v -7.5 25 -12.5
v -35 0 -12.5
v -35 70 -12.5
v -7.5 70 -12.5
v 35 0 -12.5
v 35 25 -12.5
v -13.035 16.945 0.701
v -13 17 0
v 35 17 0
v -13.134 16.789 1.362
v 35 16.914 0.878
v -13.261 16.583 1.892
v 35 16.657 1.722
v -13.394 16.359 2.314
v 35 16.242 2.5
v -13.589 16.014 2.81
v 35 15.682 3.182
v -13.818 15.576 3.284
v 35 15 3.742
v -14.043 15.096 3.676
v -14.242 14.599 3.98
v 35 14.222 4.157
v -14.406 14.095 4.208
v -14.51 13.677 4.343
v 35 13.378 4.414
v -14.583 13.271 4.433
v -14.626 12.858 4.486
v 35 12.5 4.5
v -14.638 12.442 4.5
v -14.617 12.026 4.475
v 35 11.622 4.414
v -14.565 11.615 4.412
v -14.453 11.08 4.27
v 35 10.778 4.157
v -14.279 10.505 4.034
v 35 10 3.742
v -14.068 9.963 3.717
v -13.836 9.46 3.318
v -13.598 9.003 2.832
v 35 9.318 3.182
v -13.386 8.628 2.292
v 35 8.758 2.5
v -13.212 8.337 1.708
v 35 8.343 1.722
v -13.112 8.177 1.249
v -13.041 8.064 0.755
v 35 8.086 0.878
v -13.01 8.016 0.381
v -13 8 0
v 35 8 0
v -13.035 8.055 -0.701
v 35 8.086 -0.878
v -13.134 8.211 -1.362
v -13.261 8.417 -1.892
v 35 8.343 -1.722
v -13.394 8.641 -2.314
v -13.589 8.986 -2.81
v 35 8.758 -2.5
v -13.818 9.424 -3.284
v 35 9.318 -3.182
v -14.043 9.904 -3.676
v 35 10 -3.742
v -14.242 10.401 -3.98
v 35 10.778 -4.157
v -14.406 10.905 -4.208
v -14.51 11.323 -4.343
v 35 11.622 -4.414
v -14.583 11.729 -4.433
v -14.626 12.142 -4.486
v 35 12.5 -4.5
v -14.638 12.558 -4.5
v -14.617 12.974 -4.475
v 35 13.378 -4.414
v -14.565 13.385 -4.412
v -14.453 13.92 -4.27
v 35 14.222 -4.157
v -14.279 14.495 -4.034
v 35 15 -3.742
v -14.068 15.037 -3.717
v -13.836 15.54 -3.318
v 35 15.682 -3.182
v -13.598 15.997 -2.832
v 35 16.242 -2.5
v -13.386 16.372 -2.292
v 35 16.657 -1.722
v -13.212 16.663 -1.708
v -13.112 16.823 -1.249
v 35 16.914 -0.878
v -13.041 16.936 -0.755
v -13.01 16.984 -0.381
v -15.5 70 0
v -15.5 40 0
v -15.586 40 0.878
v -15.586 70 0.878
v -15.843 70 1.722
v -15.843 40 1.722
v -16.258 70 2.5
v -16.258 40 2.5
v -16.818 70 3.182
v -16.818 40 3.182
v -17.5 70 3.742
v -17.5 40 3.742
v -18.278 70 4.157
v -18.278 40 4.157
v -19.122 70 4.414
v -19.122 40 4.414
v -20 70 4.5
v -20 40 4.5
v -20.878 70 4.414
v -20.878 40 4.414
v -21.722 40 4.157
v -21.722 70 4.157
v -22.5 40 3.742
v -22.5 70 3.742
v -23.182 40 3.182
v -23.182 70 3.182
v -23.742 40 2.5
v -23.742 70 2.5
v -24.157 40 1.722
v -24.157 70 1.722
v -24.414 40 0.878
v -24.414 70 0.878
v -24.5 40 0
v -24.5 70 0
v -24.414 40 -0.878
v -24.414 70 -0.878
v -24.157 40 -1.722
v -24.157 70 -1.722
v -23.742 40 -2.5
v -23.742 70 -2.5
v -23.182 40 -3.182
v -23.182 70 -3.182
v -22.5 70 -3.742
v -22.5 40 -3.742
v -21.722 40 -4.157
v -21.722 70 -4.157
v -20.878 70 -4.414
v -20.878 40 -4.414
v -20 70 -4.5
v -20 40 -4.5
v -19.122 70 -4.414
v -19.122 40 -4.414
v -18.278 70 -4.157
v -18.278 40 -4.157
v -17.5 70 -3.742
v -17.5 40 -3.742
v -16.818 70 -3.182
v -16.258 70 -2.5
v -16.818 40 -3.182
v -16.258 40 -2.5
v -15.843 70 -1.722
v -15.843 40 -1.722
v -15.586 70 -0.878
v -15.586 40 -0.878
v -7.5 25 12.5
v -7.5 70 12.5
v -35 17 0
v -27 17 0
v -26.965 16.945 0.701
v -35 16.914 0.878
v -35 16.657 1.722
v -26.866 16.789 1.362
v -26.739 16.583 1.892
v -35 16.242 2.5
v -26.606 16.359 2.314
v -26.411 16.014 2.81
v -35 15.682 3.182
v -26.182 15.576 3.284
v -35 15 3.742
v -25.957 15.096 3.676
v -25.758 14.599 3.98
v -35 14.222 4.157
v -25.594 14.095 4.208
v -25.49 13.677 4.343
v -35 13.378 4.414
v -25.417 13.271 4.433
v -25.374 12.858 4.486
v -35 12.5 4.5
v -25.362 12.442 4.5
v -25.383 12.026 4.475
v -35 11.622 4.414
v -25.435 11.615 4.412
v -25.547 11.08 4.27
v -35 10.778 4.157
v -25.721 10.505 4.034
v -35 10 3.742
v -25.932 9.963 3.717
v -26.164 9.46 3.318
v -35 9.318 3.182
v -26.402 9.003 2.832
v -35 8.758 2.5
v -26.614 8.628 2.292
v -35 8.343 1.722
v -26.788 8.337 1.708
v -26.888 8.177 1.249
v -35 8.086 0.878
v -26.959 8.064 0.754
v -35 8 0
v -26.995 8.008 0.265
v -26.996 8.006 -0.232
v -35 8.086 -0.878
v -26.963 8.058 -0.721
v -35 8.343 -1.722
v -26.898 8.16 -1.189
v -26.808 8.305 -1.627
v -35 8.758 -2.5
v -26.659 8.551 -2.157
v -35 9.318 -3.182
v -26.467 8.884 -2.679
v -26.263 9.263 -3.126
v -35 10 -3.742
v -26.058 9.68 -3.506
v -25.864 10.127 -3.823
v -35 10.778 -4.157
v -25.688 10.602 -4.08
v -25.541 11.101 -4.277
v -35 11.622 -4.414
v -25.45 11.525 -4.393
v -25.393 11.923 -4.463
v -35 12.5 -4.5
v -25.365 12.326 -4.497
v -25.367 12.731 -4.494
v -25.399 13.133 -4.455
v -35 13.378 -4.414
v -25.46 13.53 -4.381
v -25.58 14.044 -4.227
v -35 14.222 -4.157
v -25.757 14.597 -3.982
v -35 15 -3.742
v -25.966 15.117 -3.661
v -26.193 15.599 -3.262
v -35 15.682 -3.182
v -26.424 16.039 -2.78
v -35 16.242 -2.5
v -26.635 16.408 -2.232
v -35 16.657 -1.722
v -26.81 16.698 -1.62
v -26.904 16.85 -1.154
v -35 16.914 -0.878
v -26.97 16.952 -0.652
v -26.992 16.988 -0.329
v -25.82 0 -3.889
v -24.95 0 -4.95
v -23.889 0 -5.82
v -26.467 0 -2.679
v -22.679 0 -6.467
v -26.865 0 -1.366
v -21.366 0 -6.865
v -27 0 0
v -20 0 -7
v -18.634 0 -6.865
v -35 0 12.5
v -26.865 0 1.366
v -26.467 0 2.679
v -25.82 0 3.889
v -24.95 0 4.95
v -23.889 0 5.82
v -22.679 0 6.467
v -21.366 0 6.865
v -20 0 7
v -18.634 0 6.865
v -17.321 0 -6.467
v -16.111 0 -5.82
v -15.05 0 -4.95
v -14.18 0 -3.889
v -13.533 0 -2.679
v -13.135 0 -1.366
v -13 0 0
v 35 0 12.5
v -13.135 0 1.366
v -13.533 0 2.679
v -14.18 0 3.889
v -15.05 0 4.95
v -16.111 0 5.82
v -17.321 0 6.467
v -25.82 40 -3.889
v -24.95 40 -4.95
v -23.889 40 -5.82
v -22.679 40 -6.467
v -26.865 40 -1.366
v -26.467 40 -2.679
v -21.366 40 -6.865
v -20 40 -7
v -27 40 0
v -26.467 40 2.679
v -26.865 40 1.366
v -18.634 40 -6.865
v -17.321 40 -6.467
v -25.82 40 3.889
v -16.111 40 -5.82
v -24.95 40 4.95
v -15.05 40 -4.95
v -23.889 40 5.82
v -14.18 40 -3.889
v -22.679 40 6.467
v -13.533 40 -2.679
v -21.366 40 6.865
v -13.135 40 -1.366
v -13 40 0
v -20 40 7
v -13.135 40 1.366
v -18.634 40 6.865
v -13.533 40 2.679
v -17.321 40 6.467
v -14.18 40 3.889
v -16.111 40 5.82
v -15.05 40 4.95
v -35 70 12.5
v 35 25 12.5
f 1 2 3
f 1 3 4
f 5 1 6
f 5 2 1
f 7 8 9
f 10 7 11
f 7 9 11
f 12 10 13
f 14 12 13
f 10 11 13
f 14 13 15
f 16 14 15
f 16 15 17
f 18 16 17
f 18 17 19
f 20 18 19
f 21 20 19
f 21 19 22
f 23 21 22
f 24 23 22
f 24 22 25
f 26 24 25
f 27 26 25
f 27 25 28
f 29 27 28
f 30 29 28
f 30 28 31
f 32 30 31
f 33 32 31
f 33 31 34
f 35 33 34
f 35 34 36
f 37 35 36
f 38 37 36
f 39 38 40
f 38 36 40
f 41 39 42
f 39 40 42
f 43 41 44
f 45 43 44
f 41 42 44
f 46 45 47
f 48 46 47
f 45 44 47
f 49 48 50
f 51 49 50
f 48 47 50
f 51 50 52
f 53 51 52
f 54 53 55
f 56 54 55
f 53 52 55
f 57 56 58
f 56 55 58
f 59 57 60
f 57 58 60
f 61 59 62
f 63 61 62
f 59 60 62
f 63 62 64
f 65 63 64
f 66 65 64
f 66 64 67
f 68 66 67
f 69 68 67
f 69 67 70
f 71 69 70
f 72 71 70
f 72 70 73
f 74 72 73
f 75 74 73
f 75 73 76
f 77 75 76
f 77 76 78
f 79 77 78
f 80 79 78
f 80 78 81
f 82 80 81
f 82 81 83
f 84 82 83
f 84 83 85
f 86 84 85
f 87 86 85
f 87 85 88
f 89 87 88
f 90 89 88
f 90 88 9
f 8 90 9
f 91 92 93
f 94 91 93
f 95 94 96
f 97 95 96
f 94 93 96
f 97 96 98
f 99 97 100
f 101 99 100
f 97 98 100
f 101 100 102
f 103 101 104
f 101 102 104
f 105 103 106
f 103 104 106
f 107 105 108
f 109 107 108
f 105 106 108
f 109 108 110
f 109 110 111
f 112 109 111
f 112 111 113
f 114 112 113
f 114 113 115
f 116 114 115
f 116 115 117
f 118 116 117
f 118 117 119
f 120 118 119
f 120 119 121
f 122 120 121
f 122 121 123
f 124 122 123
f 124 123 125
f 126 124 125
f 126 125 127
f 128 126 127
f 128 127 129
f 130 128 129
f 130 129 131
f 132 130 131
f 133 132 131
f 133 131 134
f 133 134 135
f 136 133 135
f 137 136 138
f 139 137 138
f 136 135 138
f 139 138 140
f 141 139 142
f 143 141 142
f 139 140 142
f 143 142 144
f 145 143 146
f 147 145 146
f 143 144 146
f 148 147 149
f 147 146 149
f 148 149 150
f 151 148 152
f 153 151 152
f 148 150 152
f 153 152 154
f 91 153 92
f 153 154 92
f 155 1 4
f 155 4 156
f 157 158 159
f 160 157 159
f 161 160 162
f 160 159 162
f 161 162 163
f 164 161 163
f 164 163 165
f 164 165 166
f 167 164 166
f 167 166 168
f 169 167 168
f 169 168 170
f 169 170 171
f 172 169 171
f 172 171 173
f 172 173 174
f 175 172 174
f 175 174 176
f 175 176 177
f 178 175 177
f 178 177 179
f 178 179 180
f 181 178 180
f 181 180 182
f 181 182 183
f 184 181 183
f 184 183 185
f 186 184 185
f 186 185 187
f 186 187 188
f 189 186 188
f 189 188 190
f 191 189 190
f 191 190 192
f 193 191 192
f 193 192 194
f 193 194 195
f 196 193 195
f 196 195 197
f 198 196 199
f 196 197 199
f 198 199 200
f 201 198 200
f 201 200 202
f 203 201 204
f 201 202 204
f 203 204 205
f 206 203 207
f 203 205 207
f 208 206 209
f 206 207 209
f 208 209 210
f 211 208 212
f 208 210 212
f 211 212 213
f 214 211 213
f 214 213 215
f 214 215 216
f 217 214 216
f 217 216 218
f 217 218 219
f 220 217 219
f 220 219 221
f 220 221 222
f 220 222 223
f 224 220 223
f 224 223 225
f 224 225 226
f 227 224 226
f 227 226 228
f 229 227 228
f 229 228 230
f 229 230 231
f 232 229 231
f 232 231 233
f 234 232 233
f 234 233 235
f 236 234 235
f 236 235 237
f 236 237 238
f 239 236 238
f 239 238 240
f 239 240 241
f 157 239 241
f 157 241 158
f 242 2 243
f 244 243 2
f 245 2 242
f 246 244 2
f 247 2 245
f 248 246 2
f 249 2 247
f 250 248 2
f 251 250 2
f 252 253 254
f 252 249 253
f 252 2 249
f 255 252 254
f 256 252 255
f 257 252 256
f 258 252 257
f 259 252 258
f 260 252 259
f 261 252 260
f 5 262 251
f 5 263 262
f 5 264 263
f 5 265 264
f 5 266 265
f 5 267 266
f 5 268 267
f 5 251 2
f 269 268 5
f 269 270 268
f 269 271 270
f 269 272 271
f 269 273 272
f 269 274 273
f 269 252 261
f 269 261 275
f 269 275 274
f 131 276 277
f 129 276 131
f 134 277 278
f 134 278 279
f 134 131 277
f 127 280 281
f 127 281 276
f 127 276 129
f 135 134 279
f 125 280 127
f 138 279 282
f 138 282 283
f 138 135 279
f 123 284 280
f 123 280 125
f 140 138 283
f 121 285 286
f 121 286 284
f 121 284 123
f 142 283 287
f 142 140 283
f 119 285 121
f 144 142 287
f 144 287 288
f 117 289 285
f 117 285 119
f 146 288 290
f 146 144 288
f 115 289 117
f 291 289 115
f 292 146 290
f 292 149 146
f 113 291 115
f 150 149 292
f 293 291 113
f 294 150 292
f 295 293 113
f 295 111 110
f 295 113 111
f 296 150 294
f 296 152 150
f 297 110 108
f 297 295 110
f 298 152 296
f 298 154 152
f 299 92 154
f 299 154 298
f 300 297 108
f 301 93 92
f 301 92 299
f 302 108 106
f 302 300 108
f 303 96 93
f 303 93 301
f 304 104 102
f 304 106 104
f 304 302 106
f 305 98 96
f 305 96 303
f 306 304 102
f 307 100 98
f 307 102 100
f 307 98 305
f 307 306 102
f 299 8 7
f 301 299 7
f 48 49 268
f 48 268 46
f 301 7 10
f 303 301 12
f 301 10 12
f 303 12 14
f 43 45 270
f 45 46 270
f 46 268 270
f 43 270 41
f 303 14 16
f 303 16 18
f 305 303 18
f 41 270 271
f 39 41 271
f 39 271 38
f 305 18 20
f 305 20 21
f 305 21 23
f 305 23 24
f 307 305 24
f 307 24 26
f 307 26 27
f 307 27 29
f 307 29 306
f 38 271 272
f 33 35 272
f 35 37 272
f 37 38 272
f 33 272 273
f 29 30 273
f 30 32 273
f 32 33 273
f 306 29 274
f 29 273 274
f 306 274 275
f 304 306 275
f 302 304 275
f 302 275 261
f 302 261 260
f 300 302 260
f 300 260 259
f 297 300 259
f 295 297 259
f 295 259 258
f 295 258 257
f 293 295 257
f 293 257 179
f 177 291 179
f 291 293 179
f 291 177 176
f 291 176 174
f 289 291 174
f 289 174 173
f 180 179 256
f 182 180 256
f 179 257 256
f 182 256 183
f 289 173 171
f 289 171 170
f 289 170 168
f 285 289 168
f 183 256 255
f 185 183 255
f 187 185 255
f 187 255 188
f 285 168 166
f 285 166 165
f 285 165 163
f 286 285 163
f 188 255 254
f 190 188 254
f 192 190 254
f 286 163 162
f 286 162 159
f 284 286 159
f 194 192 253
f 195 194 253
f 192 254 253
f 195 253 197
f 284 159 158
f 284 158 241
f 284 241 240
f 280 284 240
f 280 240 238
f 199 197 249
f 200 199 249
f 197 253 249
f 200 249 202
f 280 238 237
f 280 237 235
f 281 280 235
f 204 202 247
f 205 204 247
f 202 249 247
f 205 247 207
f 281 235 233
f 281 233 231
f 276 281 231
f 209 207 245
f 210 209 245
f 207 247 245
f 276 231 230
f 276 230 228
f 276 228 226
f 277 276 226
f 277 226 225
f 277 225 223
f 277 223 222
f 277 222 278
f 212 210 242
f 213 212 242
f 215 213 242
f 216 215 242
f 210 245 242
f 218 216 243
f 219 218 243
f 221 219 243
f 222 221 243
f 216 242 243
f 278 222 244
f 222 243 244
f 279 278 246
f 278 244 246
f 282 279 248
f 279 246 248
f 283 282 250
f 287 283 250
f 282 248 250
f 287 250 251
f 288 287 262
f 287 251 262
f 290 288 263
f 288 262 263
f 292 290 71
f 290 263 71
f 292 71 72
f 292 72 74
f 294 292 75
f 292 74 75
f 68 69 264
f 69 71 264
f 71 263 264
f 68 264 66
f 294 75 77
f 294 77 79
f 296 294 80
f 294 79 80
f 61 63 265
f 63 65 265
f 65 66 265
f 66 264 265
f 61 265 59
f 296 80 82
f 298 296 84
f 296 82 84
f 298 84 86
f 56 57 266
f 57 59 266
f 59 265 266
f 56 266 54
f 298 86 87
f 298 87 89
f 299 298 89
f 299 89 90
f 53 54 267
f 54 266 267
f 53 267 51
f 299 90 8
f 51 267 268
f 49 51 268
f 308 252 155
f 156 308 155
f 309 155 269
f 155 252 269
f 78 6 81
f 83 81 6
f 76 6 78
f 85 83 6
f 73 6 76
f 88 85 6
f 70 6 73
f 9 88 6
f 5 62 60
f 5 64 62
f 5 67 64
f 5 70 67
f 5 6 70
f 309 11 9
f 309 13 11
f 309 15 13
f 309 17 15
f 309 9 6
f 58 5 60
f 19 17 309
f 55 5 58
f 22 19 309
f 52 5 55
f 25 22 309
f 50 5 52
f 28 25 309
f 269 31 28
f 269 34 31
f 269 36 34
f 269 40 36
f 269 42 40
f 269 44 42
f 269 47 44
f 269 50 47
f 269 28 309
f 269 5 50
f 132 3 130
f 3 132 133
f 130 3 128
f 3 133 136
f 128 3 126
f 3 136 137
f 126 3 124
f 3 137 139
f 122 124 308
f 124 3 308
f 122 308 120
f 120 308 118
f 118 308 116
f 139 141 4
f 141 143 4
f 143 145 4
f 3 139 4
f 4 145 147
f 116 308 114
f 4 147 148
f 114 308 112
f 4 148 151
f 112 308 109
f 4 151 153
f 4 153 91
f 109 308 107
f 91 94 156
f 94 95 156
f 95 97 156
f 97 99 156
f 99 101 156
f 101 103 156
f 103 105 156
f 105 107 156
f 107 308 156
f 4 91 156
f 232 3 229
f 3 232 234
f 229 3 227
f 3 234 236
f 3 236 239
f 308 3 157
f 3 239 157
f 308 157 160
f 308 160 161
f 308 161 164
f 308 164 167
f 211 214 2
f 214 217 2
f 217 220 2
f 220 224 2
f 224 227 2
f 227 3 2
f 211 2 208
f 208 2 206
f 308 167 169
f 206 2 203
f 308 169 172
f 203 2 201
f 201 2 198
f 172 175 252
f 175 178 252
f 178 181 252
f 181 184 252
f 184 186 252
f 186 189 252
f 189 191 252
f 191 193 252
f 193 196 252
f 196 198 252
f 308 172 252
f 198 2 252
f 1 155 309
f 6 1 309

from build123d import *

# Parameters (mm, degrees)
F0_W     = 25
F0_H     = 25
F0_R     = 7
F0_R_2   = 4.5
F0_W_2   = 2.5
F1_DEPTH = 70
F2_DEPTH = 40
F0_W_3   = 42.5
F3_DEPTH = 25
F4_R     = 4.5
F5_DEPTH = 70.001


with BuildPart() as f1:
    # F0 (on Front) → F1 (new body)
    with BuildSketch(Plane.XZ):
        with Locations((-20, 0)):
            Rectangle(F0_W, F0_H)
        with Locations((-20, 0)):
            Circle(F0_R, mode=Mode.SUBTRACT)
        with Locations((-20, 0)):
            Circle(F0_R)
        with Locations((-20, 0)):
            Circle(F0_R_2, mode=Mode.SUBTRACT)
        with Locations((-33.75, 0)):
            Rectangle(F0_W_2, F0_H)
    extrude(amount=-F1_DEPTH)

    # F0 (on Front) → F2 (cut)
    with BuildSketch(Plane.XZ):
        with Locations((-20, 0)):
            Circle(F0_R)
        with Locations((-20, 0)):
            Circle(F0_R_2, mode=Mode.SUBTRACT)
    extrude(amount=-F2_DEPTH, mode=Mode.SUBTRACT)

    # F0 (on Front) → F3 (join)
    with BuildSketch(Plane.XZ):
        with Locations((13.75, 0)):
            Rectangle(F0_W_3, F0_H)
    extrude(amount=-F3_DEPTH)

    # F4 (on face) → F5 (cut, through all)
    with BuildSketch(Plane.YZ.offset(35)):
        with Locations((12.5, 0)):
            Circle(F4_R)
    extrude(amount=-F5_DEPTH, mode=Mode.SUBTRACT)


solid = f1.part
